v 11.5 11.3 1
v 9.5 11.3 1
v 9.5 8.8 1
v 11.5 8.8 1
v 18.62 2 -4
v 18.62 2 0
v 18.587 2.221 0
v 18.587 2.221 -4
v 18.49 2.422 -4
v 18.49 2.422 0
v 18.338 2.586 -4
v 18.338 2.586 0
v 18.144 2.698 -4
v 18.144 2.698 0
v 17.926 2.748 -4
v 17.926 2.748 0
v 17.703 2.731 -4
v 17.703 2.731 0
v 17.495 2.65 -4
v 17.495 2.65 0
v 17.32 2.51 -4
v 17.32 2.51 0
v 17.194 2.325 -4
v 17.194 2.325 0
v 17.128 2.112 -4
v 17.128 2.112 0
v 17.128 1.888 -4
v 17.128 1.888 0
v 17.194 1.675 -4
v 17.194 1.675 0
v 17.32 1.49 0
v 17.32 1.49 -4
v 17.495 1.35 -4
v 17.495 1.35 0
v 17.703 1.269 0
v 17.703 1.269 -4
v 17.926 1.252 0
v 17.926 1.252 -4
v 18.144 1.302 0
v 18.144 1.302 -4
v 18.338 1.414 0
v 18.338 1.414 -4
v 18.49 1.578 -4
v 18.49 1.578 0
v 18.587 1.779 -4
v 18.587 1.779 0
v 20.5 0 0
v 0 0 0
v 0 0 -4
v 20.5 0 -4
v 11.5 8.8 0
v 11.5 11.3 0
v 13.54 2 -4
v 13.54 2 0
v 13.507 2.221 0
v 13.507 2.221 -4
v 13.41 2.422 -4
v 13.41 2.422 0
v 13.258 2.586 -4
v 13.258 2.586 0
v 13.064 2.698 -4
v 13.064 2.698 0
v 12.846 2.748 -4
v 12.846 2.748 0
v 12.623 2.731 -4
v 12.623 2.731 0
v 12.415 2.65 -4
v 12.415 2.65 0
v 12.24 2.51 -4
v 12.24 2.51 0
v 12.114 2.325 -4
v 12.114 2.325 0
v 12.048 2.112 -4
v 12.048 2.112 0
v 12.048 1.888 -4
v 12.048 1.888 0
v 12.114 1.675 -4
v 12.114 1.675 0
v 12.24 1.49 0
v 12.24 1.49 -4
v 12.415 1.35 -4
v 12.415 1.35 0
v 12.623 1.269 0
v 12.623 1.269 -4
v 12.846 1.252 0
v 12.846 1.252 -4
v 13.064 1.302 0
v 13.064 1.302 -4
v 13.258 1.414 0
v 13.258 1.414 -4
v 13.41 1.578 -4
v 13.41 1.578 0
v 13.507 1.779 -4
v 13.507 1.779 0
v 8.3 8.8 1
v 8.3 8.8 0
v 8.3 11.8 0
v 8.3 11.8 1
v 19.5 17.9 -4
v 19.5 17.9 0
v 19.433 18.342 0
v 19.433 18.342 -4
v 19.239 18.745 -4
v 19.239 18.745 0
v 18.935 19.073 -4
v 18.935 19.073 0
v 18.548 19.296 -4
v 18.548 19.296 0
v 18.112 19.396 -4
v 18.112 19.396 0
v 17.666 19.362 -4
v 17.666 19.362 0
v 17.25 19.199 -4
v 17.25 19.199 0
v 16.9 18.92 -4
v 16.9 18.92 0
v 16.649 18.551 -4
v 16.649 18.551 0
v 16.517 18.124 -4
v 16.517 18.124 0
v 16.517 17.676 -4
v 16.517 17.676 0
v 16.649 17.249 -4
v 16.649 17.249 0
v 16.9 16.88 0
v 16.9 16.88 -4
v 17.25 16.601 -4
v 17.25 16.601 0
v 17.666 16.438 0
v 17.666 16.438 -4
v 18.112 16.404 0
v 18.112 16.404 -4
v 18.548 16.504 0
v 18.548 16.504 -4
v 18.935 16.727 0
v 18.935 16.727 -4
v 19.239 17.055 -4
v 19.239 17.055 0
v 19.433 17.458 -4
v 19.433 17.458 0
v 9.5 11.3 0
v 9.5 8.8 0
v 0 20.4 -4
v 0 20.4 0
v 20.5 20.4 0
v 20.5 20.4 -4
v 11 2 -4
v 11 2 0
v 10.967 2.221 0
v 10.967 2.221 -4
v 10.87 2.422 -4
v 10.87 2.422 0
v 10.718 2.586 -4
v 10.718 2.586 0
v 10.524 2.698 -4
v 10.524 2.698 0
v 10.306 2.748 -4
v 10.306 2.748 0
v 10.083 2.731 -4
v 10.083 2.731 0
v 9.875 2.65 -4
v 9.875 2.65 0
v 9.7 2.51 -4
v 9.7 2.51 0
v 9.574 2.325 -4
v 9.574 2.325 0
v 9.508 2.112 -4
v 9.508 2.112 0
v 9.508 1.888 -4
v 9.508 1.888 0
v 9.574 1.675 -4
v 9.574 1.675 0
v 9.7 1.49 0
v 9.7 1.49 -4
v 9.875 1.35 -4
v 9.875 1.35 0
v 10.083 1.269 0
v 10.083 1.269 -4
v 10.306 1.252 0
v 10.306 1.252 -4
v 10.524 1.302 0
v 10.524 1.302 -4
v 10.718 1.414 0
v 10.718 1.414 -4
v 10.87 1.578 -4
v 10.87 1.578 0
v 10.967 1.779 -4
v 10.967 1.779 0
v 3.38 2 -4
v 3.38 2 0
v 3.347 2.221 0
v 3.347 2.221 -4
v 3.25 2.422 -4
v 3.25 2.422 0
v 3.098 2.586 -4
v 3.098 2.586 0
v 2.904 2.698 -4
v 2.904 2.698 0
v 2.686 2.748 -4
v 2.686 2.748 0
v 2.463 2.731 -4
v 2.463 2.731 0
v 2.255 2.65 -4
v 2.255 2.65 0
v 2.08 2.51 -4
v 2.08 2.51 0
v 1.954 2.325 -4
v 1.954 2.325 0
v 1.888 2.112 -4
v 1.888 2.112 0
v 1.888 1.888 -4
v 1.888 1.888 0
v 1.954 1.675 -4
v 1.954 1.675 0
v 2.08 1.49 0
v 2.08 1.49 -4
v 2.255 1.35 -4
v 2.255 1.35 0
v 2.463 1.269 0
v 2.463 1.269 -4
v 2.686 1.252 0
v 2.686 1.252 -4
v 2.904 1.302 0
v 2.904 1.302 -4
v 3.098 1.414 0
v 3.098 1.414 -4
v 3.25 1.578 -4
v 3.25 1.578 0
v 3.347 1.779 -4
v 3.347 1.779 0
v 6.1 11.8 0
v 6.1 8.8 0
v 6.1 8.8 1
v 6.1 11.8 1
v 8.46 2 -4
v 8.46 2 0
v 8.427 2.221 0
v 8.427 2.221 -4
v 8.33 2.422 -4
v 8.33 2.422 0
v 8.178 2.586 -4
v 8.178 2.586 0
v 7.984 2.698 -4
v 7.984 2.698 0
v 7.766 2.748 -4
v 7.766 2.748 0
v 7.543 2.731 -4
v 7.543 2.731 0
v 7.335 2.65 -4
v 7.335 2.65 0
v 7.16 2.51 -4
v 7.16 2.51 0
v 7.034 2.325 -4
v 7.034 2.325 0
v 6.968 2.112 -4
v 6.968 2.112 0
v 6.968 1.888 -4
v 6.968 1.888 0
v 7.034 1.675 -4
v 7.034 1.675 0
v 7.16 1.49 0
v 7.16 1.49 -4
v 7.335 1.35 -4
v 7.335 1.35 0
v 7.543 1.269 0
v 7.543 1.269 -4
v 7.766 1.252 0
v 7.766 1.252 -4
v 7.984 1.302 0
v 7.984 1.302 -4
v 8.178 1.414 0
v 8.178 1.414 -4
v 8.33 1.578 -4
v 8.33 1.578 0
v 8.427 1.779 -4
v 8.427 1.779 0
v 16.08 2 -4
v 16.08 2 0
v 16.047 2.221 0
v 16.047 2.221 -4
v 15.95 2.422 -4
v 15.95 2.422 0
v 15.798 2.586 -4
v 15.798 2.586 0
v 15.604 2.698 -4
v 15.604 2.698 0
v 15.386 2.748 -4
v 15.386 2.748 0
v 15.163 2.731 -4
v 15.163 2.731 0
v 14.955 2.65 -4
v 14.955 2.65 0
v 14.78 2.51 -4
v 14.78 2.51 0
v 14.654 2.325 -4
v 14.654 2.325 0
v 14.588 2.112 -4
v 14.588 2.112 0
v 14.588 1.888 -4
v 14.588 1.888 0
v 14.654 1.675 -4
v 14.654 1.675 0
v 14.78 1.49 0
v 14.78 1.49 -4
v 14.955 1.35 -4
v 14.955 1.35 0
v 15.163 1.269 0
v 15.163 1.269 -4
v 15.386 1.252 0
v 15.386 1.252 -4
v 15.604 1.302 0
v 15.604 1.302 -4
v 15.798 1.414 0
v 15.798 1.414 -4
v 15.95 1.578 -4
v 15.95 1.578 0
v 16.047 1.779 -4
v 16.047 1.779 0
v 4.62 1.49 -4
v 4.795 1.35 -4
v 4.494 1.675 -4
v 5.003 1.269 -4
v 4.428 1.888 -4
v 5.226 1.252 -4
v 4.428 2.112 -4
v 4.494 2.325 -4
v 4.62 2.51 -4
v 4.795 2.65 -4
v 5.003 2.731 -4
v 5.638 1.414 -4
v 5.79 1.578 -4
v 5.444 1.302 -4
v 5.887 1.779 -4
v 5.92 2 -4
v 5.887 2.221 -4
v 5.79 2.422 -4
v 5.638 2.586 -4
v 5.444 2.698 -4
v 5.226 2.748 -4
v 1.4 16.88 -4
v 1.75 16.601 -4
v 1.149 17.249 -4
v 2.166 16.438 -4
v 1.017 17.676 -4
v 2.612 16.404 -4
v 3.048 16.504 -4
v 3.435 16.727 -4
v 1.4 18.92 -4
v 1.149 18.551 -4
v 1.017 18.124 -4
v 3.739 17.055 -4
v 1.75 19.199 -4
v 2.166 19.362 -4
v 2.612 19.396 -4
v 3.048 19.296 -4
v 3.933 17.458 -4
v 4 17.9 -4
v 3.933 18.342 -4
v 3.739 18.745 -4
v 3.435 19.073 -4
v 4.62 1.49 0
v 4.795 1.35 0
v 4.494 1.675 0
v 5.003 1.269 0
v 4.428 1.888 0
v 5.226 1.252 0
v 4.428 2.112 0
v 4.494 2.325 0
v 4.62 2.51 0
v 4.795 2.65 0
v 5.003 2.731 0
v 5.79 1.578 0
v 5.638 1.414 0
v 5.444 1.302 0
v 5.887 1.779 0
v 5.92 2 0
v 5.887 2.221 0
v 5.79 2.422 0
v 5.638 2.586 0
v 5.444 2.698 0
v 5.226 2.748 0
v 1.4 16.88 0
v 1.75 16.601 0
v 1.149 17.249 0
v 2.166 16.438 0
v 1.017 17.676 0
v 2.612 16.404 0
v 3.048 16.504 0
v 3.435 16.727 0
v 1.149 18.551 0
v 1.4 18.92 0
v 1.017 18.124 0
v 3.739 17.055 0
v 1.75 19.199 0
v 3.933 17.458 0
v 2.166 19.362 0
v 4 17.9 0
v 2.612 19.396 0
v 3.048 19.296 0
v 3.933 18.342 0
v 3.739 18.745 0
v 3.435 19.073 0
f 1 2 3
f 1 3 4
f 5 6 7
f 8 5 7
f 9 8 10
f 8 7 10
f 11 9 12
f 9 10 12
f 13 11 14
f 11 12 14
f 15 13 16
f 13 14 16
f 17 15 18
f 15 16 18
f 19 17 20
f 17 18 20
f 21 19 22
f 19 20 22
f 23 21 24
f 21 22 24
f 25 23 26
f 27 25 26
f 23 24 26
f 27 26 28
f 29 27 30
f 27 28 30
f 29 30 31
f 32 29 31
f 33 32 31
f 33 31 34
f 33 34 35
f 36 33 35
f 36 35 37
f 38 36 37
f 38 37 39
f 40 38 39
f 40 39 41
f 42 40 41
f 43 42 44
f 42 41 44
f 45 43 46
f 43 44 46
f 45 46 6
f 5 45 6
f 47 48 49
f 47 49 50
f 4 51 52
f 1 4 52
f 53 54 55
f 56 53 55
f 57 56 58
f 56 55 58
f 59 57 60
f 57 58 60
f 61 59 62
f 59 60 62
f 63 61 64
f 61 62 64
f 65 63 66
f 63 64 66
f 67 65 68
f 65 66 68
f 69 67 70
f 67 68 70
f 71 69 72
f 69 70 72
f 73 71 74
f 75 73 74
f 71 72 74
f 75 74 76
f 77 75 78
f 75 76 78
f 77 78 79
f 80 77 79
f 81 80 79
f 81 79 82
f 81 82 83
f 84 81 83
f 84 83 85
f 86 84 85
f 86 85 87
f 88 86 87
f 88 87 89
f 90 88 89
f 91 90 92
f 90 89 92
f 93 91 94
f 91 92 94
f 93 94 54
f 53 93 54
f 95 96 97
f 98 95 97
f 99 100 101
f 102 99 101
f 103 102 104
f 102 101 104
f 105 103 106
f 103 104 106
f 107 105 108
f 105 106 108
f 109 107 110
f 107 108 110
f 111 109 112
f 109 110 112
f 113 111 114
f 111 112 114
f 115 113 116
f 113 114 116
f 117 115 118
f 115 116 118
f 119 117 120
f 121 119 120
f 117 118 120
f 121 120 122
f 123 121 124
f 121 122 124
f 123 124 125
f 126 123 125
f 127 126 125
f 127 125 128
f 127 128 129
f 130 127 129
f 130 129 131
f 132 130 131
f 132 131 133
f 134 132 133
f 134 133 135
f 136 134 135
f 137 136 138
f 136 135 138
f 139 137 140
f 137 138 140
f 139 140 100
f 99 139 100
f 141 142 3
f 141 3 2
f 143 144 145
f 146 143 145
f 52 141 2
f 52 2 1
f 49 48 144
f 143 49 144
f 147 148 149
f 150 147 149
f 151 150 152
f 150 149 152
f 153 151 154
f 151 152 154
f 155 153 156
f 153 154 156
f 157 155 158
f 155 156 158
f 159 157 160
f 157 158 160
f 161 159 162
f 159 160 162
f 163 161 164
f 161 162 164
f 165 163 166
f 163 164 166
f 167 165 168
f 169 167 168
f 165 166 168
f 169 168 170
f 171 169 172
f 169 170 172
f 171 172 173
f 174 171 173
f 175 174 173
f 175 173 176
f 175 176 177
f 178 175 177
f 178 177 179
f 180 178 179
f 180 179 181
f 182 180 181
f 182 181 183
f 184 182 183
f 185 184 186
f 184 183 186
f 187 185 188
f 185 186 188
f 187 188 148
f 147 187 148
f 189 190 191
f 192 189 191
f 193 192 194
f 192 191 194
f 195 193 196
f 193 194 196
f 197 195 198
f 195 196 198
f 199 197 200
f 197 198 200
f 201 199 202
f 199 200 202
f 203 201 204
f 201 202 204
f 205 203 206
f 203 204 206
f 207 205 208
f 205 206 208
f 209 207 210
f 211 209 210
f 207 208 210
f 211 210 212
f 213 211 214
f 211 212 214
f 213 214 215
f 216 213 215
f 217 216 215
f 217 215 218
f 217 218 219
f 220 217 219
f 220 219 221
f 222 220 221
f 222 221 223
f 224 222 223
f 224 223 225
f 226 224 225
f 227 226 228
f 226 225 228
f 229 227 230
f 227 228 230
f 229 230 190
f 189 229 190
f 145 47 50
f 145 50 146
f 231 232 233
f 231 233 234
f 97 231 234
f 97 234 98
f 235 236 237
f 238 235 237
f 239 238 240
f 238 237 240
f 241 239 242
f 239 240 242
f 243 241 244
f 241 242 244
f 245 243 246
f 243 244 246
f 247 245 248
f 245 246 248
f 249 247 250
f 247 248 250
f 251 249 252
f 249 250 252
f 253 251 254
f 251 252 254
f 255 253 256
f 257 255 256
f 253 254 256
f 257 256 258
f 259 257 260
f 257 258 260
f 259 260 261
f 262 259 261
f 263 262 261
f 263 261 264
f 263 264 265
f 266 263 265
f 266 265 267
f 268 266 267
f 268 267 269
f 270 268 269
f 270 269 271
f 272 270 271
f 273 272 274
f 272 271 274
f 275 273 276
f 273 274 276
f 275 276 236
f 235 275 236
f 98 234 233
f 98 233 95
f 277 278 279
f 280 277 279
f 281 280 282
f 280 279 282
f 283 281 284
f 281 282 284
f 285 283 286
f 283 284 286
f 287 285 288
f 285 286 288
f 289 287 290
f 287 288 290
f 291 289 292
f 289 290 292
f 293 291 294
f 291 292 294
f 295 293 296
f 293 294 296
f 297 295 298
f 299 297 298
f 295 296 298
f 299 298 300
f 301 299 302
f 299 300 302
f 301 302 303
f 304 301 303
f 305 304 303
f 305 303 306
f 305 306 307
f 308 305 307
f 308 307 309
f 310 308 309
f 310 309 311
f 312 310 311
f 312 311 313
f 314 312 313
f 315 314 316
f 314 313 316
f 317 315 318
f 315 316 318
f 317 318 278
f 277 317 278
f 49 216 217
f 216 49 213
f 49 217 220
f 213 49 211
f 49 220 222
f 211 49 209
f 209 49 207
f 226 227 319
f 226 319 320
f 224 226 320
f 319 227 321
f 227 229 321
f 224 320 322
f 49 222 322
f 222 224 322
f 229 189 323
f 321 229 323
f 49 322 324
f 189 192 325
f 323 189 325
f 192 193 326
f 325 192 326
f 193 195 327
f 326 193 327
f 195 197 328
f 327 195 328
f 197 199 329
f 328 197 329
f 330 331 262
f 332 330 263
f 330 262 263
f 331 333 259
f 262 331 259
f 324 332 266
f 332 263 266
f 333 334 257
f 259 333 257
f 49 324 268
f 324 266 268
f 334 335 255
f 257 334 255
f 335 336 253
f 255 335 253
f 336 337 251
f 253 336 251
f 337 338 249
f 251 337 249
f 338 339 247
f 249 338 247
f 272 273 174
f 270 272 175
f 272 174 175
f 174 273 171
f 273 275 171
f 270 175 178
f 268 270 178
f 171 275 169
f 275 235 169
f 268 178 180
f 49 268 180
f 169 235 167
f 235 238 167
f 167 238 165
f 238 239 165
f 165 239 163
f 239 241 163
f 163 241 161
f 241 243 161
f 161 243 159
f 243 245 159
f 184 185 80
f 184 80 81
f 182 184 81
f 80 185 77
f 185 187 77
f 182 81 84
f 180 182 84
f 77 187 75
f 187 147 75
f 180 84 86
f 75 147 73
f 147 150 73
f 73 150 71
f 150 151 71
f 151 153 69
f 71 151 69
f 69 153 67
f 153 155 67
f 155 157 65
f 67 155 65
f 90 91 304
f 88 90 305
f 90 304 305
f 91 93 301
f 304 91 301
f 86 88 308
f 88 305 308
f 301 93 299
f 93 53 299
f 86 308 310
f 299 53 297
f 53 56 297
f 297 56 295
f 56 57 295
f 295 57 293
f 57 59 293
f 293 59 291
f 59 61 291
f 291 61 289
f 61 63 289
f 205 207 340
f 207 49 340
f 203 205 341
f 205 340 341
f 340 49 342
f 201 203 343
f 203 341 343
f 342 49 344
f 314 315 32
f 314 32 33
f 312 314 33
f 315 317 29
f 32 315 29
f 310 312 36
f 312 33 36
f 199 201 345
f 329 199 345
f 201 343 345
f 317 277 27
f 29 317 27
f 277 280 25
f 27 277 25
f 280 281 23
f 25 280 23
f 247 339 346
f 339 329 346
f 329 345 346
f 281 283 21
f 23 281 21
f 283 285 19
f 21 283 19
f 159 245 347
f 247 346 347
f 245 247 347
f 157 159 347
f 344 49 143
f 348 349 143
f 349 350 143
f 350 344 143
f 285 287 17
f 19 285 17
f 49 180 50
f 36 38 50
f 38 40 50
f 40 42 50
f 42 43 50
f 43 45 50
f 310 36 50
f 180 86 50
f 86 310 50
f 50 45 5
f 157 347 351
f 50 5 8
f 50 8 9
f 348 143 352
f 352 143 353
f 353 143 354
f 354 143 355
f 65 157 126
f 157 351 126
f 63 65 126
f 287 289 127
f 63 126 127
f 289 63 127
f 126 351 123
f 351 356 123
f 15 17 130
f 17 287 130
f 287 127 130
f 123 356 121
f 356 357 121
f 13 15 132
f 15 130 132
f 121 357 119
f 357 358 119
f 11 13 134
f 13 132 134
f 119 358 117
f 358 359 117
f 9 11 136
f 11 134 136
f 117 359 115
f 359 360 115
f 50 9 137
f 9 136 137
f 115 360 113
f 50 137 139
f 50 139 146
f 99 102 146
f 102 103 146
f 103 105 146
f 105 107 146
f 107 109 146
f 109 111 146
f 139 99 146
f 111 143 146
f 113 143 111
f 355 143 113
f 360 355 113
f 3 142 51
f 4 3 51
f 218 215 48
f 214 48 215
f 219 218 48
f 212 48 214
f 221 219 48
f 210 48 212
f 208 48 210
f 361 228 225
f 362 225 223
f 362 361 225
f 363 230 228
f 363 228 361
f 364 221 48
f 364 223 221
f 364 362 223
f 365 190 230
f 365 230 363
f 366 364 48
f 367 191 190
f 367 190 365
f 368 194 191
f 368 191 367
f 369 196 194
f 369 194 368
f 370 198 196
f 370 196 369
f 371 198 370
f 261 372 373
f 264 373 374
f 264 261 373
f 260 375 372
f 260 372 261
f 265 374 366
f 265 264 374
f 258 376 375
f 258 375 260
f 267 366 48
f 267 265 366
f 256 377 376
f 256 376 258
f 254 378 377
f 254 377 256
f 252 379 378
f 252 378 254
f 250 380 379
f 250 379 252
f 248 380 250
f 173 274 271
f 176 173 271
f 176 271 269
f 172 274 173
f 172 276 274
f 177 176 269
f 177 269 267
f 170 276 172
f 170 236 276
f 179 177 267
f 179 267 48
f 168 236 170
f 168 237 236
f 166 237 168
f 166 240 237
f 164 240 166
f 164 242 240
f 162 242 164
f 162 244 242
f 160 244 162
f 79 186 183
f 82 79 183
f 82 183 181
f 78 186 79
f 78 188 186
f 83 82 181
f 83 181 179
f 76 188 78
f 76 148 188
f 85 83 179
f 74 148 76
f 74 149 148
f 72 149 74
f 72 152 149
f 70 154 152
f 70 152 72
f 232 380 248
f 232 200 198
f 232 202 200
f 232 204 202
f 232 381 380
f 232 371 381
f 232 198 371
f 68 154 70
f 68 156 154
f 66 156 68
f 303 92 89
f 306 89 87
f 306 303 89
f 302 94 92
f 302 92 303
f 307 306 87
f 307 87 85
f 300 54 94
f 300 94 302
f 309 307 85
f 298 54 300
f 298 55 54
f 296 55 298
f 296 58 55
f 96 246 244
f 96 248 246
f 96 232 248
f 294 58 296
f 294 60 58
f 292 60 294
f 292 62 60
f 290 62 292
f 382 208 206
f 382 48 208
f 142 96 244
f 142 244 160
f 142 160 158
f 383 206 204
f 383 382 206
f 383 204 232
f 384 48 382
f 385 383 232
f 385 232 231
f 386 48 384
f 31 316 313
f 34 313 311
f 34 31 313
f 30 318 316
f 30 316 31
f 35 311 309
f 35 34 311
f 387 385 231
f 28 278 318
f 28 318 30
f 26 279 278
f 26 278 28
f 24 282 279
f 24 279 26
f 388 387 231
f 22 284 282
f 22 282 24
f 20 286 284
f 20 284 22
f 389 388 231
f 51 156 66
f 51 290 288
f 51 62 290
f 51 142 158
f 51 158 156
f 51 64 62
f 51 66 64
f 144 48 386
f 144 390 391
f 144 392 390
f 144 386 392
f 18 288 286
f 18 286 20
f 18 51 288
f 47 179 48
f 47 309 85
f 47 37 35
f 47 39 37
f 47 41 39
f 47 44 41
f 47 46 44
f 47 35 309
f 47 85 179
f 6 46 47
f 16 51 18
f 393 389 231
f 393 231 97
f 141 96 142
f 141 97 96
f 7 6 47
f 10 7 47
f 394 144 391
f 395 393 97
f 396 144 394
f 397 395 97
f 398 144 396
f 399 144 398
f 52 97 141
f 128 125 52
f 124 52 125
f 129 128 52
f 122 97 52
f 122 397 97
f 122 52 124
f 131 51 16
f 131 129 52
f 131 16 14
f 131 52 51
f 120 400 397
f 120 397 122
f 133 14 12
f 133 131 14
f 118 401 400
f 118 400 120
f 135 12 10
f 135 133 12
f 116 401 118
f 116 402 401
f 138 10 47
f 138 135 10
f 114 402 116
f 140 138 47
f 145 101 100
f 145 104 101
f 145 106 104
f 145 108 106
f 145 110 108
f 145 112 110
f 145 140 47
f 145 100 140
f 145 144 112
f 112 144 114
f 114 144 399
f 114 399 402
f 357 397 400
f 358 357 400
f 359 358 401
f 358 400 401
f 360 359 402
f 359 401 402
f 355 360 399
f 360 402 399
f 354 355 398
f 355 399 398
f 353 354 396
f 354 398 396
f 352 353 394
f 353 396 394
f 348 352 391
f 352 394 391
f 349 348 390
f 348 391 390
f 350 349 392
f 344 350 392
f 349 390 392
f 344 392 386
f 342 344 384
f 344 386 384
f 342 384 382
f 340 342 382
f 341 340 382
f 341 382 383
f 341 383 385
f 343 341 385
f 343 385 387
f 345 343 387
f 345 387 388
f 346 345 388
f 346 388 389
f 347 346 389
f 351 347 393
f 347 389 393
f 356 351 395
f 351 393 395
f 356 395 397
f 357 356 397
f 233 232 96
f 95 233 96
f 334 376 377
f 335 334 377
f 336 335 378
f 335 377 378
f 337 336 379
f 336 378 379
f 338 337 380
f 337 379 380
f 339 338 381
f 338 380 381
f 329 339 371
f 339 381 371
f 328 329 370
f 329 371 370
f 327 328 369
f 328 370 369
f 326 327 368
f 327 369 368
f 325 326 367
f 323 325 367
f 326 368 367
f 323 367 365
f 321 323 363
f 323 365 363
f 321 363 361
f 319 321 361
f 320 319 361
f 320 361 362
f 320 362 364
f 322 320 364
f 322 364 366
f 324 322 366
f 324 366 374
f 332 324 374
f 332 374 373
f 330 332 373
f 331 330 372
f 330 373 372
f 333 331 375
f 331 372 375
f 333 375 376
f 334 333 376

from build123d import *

# Parameters (mm, degrees)
ESQUISSE2_W             = 20.5
ESQUISSE2_H             = 20.4
BOSS_EXTRU_1_DEPTH      = 4
ESQUISSE3_R             = 1.5
ESQUISSE3_R_2           = 0.75
ENL_V_MAT_EXTRU_1_DEPTH = 4
ESQUISSE4_W             = 2.2
ESQUISSE4_H             = 3
ESQUISSE4_W_2           = 2
ESQUISSE4_H_2           = 2.5
BOSS_EXTRU_2_DEPTH      = 1


with BuildPart() as part:
    # Esquisse2 → Boss.-Extru.1 (new body)
    with BuildSketch(Plane.XY):
        with Locations((10.25, 10.2)):
            Rectangle(ESQUISSE2_W, ESQUISSE2_H)
    extrude(amount=-BOSS_EXTRU_1_DEPTH)

    # Esquisse3 → Enlèv. mat.-Extru.1 (cut)
    with BuildSketch(Plane.XY):
        with Locations((2.5, 17.9)):
            Circle(ESQUISSE3_R)
        with Locations((18, 17.9)):
            Circle(ESQUISSE3_R)
        with Locations((2.63, 2)):
            Circle(ESQUISSE3_R_2)
        with Locations((5.17, 2)):
            Circle(ESQUISSE3_R_2)
        with Locations((7.71, 2)):
            Circle(ESQUISSE3_R_2)
        with Locations((10.25, 2)):
            Circle(ESQUISSE3_R_2)
        with Locations((12.79, 2)):
            Circle(ESQUISSE3_R_2)
        with Locations((15.33, 2)):
            Circle(ESQUISSE3_R_2)
        with Locations((17.87, 2)):
            Circle(ESQUISSE3_R_2)
    extrude(amount=-ENL_V_MAT_EXTRU_1_DEPTH, mode=Mode.SUBTRACT)

    # Esquisse4 → Boss.-Extru.2 (add)
    with BuildSketch(Plane.XY):
        with Locations((7.2, 10.3)):
            Rectangle(ESQUISSE4_W, ESQUISSE4_H)
        with Locations((10.5, 10.05)):
            Rectangle(ESQUISSE4_W_2, ESQUISSE4_H_2)
    extrude(amount=BOSS_EXTRU_2_DEPTH)


solid = part.part
